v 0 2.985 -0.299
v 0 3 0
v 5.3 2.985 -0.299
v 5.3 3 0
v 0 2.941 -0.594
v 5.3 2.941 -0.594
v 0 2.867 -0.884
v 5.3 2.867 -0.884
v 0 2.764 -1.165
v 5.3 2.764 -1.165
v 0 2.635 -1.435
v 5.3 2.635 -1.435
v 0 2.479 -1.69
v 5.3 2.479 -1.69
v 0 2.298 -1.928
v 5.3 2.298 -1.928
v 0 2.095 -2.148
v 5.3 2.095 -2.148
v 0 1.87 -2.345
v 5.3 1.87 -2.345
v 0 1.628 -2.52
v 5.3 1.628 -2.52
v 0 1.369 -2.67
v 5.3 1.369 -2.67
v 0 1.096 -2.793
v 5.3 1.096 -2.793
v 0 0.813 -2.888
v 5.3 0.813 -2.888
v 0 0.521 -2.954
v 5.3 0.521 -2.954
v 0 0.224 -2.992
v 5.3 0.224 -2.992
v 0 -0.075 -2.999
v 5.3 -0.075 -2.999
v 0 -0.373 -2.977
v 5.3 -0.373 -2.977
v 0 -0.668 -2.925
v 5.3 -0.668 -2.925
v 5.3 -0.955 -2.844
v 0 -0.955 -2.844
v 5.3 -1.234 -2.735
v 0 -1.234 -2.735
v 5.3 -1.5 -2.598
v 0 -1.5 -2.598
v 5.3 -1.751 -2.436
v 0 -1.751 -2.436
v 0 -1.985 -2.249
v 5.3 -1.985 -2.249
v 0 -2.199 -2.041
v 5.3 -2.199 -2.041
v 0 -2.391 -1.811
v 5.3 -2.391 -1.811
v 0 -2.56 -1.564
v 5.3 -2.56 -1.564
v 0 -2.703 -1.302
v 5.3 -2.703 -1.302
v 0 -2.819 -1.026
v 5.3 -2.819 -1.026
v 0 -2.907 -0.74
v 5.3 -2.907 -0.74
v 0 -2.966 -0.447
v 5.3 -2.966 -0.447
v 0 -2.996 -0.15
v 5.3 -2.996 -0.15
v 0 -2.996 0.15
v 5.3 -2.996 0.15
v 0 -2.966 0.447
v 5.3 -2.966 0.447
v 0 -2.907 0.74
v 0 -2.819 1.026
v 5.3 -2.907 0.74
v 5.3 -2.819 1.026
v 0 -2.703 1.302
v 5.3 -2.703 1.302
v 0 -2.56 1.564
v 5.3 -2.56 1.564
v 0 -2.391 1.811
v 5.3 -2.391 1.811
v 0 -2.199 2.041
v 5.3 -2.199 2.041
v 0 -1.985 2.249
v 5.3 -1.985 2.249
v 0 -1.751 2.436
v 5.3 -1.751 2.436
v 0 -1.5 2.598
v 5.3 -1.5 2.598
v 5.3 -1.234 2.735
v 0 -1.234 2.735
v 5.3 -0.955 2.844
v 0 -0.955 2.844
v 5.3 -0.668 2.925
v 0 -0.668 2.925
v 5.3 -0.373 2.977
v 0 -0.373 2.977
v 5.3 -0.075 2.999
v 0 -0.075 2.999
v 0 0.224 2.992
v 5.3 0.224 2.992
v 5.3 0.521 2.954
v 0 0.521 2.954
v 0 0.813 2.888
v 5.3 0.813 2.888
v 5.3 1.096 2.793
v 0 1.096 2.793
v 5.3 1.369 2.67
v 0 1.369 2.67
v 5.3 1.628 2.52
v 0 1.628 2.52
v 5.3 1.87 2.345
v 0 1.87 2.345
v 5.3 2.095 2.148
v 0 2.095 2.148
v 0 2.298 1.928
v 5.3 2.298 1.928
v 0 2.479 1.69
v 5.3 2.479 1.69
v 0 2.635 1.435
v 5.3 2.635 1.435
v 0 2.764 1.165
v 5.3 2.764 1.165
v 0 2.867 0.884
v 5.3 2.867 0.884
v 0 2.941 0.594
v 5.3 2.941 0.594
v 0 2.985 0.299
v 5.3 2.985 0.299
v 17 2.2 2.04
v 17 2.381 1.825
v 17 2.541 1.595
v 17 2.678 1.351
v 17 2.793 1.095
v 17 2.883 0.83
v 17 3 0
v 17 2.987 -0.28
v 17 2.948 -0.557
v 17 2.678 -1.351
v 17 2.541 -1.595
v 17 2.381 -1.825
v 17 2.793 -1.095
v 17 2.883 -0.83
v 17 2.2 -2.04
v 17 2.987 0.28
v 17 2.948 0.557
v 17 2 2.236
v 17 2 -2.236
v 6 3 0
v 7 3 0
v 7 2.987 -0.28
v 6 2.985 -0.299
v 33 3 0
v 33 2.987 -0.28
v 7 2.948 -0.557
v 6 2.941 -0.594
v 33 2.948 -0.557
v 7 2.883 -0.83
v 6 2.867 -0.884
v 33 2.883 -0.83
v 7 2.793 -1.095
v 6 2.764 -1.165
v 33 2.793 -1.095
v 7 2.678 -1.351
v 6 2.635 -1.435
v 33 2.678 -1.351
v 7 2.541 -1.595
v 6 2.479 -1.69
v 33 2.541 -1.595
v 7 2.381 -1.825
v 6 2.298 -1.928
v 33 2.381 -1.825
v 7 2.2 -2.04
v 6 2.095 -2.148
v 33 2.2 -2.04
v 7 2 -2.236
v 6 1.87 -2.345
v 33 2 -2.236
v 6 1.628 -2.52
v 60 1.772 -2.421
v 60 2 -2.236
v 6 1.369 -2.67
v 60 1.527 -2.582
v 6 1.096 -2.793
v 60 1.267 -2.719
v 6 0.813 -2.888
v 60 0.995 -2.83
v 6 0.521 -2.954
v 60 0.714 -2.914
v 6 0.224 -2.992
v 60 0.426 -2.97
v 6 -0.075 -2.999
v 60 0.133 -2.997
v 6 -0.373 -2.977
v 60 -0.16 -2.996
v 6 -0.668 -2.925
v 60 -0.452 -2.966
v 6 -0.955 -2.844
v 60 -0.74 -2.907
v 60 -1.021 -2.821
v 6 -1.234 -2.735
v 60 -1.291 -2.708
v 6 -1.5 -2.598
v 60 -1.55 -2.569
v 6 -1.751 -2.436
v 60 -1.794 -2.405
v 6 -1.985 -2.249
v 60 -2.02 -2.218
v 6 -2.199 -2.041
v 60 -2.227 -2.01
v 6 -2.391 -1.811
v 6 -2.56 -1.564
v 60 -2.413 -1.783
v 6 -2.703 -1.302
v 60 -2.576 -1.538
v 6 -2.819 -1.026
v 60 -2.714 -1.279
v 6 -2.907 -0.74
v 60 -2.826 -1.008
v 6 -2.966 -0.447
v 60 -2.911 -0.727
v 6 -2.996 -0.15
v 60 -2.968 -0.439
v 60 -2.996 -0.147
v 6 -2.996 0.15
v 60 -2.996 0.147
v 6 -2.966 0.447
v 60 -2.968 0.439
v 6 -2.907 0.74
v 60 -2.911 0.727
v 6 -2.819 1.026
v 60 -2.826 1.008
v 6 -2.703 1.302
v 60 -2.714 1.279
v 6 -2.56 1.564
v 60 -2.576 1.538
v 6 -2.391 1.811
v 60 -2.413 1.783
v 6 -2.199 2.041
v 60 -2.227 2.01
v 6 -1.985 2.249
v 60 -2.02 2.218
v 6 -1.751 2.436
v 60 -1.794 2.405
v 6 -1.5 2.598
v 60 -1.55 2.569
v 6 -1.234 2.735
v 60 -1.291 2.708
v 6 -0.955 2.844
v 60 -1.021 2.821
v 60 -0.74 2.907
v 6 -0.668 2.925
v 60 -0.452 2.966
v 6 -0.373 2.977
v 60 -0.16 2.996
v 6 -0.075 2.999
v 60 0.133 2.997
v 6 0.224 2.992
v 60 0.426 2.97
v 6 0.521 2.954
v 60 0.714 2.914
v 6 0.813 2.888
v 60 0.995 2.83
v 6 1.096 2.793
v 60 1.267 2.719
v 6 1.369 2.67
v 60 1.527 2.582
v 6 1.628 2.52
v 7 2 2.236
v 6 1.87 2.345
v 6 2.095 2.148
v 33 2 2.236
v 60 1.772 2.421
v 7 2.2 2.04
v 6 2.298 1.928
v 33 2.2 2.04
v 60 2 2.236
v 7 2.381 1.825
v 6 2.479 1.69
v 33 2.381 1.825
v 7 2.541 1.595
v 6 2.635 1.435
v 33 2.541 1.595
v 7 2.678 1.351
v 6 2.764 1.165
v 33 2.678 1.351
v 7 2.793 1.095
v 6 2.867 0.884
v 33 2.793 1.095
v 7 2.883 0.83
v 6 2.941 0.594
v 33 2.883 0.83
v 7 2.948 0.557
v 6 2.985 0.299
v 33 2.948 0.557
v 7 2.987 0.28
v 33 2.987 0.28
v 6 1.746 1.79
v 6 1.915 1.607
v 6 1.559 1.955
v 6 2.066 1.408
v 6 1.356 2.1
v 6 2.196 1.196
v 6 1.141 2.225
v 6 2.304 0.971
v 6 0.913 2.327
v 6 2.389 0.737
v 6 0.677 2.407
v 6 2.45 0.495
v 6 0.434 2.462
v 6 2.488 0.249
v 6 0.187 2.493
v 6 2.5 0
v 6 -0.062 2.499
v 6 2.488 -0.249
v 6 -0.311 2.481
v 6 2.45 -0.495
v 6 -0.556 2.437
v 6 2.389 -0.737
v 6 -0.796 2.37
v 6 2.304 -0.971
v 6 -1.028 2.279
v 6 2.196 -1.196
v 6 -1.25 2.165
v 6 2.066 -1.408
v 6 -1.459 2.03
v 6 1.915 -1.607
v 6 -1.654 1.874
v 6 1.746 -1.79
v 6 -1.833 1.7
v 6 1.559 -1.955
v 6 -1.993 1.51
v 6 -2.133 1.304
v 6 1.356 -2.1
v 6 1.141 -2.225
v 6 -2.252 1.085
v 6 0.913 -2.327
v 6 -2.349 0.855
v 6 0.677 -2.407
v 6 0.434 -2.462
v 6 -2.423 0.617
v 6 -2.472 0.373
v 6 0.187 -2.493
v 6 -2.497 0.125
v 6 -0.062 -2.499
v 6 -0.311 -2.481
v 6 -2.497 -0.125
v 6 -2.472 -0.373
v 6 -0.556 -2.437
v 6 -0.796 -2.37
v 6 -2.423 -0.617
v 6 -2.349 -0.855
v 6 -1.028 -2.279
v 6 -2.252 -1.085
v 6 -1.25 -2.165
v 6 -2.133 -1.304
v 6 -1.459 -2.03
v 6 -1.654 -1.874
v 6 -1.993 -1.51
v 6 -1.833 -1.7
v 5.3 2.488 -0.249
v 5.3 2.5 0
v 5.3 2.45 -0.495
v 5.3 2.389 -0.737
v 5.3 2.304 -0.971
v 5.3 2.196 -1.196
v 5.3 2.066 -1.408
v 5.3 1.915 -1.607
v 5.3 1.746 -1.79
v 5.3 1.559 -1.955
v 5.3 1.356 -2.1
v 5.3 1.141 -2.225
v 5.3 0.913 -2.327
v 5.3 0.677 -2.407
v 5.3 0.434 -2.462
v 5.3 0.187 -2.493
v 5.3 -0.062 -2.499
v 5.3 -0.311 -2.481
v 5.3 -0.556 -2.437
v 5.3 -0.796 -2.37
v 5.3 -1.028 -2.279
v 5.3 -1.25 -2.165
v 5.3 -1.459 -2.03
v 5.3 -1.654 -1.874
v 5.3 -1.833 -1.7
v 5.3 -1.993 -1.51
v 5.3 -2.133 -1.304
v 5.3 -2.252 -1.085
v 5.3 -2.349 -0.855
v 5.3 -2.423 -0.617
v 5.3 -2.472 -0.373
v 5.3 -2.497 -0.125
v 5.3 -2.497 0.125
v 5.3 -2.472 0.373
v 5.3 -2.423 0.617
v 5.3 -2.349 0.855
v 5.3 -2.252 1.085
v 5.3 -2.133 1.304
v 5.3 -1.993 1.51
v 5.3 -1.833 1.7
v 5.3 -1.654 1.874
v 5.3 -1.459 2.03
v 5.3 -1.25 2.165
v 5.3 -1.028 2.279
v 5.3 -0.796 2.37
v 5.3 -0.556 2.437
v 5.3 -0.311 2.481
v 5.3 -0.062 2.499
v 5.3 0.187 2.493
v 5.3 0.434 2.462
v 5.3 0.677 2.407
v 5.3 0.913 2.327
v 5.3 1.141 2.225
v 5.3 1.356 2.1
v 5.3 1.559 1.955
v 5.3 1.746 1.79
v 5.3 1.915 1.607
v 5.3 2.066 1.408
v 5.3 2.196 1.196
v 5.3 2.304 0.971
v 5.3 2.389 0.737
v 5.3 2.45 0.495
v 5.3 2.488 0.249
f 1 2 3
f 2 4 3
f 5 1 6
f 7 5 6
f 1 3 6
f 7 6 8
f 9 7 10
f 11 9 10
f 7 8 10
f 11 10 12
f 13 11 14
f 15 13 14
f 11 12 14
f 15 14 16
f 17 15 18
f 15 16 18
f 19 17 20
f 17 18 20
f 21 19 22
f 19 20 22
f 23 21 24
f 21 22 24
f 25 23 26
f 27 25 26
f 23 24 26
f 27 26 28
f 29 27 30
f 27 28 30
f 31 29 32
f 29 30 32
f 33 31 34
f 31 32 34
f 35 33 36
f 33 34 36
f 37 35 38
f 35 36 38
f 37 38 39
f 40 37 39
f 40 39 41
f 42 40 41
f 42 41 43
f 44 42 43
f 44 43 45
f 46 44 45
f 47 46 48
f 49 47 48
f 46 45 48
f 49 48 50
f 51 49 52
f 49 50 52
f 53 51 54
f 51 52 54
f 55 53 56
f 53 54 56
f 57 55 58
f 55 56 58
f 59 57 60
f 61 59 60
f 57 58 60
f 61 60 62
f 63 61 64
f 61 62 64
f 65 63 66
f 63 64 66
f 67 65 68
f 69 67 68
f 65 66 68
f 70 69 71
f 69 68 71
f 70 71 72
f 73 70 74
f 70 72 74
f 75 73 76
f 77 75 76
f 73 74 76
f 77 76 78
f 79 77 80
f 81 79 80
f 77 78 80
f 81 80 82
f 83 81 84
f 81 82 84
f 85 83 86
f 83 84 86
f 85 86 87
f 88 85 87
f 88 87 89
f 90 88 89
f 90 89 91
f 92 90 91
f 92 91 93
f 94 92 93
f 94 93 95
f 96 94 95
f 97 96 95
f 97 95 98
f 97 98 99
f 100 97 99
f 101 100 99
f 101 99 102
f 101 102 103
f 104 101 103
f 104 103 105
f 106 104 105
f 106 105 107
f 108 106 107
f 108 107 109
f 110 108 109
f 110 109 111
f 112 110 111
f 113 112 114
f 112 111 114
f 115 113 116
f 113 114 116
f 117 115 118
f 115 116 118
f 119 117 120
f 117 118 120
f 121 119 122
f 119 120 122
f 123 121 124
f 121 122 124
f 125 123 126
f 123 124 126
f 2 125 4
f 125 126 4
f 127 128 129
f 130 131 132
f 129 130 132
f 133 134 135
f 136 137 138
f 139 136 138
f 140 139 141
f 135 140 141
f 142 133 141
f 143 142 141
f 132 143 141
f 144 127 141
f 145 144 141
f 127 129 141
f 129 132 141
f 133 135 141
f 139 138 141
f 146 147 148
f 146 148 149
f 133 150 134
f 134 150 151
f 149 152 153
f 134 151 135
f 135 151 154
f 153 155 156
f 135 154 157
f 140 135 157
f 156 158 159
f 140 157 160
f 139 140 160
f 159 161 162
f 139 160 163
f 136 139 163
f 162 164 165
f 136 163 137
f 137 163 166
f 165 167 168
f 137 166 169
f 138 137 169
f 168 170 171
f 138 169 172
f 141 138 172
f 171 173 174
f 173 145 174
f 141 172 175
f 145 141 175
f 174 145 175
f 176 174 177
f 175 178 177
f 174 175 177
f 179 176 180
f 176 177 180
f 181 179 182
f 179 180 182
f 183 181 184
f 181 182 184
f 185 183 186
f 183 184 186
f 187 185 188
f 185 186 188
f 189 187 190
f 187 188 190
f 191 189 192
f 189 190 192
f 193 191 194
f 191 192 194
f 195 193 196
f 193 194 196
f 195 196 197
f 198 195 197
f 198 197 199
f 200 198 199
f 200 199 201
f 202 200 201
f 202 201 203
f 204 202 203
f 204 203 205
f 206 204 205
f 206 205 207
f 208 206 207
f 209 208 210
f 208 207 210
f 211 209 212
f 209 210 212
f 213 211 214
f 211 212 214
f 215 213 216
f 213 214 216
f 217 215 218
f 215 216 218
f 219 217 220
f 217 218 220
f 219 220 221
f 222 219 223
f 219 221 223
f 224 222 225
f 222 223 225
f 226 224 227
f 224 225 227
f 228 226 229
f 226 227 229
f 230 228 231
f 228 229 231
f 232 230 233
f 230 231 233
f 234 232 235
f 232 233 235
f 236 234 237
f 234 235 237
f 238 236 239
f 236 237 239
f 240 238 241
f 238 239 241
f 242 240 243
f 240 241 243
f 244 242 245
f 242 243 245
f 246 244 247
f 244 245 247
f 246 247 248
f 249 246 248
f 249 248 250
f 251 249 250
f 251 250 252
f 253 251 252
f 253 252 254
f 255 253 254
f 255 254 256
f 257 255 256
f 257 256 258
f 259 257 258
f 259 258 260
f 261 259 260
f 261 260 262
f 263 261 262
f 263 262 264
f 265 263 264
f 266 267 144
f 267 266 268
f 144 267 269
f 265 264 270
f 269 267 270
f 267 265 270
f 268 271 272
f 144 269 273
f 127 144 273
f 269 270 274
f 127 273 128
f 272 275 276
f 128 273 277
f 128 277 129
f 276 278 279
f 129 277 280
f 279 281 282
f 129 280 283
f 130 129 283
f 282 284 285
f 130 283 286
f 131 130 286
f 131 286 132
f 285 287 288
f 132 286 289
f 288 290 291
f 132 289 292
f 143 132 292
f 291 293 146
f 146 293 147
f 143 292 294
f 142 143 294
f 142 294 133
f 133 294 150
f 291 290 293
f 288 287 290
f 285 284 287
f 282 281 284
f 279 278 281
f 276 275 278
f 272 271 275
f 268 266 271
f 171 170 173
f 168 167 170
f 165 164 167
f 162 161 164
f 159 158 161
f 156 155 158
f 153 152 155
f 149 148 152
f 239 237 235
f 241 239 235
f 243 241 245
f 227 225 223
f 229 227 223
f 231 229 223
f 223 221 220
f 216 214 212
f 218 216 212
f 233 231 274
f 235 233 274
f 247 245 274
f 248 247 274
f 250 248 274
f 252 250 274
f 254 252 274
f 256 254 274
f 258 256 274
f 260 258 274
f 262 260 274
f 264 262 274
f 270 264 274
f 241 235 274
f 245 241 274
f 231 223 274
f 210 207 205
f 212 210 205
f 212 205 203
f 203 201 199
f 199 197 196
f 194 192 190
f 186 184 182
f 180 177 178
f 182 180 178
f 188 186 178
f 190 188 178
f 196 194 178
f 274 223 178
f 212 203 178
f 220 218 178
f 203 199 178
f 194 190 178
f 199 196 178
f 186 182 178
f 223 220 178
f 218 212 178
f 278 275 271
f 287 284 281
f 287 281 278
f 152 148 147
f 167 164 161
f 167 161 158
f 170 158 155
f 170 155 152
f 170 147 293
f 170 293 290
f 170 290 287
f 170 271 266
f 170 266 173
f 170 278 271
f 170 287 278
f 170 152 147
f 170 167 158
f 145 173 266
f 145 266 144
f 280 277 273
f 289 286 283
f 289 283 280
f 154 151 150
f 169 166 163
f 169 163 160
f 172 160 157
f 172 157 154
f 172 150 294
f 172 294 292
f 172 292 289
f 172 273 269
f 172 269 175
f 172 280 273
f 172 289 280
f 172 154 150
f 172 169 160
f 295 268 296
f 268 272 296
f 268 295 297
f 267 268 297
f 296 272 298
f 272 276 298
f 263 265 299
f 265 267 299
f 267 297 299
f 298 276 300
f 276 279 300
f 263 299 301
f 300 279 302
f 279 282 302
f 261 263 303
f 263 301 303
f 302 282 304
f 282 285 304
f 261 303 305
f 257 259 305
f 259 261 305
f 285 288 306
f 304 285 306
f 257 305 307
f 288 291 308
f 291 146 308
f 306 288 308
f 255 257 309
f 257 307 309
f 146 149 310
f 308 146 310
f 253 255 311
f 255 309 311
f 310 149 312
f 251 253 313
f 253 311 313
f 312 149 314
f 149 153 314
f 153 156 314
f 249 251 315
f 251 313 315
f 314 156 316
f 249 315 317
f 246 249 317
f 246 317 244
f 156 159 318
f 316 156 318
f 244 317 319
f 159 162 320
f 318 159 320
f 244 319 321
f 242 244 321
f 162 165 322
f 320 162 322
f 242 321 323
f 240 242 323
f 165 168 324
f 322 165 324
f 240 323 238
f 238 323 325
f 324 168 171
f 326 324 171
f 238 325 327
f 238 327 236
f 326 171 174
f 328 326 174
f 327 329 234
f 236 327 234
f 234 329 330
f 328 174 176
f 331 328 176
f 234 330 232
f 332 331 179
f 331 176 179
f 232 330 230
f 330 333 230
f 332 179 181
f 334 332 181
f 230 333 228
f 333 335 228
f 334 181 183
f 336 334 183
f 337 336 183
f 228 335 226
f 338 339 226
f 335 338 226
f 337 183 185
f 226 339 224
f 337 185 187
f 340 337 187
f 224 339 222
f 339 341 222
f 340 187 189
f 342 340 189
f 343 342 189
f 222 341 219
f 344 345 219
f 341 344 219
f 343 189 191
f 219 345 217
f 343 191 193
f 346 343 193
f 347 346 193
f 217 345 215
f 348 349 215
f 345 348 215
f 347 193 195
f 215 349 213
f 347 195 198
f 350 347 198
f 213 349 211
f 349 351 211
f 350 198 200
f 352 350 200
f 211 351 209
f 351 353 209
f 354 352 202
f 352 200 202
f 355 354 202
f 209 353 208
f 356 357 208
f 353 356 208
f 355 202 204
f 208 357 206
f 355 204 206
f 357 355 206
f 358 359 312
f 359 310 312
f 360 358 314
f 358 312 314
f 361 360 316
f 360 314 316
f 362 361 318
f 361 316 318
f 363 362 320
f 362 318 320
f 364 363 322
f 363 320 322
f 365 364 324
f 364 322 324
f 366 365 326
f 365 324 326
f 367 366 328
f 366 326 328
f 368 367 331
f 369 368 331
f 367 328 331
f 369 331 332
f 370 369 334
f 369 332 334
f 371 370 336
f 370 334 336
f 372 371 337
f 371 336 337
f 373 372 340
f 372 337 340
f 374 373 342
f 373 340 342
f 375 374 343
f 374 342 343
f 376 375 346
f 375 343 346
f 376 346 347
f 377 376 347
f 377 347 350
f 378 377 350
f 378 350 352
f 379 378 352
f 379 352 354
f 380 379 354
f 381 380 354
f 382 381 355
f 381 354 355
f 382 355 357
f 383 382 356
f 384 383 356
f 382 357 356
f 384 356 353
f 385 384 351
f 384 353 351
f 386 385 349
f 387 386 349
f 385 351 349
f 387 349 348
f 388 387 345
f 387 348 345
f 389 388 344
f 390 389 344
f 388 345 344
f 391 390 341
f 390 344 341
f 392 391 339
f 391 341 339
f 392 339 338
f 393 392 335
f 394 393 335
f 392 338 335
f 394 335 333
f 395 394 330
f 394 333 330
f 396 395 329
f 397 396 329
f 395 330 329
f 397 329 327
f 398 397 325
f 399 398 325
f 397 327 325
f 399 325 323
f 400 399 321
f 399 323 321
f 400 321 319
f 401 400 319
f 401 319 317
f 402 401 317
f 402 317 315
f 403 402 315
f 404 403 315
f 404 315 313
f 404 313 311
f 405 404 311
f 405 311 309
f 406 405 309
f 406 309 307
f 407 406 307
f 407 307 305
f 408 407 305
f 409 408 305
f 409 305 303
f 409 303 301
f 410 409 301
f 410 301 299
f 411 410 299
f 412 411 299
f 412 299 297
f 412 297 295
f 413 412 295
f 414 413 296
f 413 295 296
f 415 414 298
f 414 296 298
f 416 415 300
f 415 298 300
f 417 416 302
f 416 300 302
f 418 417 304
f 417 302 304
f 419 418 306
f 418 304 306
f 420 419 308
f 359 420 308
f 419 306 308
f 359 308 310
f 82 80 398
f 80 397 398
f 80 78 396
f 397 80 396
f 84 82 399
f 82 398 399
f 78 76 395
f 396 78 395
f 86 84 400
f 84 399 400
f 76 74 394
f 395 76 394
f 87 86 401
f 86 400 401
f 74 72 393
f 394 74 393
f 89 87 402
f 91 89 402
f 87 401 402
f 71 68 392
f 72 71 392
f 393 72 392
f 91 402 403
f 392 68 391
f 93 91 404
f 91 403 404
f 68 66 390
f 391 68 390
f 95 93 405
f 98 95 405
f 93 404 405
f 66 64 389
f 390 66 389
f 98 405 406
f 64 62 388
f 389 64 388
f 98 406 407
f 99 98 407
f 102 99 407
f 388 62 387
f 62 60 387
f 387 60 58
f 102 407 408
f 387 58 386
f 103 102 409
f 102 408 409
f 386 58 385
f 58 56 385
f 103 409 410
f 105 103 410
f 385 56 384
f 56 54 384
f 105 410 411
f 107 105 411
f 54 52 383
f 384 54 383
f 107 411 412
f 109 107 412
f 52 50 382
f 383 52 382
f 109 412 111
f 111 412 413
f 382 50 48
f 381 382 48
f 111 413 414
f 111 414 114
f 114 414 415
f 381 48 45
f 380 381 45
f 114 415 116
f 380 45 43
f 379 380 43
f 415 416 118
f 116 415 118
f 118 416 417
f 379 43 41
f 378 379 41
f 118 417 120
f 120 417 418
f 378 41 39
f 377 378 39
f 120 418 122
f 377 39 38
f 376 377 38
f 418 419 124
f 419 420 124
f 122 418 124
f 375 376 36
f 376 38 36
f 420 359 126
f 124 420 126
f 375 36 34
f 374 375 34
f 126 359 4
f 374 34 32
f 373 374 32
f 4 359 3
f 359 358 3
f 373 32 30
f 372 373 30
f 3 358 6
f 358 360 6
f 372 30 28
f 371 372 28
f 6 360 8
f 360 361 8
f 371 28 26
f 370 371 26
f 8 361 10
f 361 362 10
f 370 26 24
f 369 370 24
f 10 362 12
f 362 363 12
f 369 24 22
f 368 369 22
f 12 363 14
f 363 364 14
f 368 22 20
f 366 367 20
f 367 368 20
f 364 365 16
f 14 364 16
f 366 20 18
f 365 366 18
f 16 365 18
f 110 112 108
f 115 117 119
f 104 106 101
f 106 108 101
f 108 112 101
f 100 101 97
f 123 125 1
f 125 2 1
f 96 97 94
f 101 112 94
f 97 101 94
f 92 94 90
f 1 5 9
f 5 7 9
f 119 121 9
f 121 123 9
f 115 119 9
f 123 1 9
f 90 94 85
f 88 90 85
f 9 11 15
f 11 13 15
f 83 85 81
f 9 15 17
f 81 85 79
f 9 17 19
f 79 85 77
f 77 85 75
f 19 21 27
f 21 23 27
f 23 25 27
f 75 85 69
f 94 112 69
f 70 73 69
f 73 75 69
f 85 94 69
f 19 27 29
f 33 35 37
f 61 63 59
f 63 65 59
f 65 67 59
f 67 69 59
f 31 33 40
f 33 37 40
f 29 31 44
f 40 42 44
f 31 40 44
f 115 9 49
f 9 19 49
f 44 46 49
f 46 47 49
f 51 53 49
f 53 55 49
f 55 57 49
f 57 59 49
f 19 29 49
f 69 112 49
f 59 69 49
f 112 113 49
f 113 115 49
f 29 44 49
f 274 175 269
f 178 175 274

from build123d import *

# Parameters (mm, degrees)
ESQUISSE2_W             = 10
ESQUISSE2_H             = 6
ESQUISSE2_W_2           = 27
ENL_V_MAT_EXTRU_1_DEPTH = 1


with BuildPart() as part:
    # Esquisse1 → Révolution1 (revolve)
    with BuildSketch(Plane.XY):
        Polygon((0, 0), (0, 3), (5.3, 3), (5.3, 2.5), (6, 2.5), (6, 3), (60, 3), (60, 0), align=None)
    revolve(axis=Axis((60, 0, 0), (-1, 0, 0)))

    # Esquisse2 → Enlèv. mat.-Extru.1 (cut)
    with BuildSketch(Plane(origin=(0, 3, 0), x_dir=(1, 0, 0), z_dir=(0, 1, 0))):
        with Locations((12, 0)):
            Rectangle(ESQUISSE2_W, ESQUISSE2_H)
        with Locations((46.5, 0)):
            Rectangle(ESQUISSE2_W_2, ESQUISSE2_H)
    extrude(amount=-ENL_V_MAT_EXTRU_1_DEPTH, mode=Mode.SUBTRACT)


solid = part.part
